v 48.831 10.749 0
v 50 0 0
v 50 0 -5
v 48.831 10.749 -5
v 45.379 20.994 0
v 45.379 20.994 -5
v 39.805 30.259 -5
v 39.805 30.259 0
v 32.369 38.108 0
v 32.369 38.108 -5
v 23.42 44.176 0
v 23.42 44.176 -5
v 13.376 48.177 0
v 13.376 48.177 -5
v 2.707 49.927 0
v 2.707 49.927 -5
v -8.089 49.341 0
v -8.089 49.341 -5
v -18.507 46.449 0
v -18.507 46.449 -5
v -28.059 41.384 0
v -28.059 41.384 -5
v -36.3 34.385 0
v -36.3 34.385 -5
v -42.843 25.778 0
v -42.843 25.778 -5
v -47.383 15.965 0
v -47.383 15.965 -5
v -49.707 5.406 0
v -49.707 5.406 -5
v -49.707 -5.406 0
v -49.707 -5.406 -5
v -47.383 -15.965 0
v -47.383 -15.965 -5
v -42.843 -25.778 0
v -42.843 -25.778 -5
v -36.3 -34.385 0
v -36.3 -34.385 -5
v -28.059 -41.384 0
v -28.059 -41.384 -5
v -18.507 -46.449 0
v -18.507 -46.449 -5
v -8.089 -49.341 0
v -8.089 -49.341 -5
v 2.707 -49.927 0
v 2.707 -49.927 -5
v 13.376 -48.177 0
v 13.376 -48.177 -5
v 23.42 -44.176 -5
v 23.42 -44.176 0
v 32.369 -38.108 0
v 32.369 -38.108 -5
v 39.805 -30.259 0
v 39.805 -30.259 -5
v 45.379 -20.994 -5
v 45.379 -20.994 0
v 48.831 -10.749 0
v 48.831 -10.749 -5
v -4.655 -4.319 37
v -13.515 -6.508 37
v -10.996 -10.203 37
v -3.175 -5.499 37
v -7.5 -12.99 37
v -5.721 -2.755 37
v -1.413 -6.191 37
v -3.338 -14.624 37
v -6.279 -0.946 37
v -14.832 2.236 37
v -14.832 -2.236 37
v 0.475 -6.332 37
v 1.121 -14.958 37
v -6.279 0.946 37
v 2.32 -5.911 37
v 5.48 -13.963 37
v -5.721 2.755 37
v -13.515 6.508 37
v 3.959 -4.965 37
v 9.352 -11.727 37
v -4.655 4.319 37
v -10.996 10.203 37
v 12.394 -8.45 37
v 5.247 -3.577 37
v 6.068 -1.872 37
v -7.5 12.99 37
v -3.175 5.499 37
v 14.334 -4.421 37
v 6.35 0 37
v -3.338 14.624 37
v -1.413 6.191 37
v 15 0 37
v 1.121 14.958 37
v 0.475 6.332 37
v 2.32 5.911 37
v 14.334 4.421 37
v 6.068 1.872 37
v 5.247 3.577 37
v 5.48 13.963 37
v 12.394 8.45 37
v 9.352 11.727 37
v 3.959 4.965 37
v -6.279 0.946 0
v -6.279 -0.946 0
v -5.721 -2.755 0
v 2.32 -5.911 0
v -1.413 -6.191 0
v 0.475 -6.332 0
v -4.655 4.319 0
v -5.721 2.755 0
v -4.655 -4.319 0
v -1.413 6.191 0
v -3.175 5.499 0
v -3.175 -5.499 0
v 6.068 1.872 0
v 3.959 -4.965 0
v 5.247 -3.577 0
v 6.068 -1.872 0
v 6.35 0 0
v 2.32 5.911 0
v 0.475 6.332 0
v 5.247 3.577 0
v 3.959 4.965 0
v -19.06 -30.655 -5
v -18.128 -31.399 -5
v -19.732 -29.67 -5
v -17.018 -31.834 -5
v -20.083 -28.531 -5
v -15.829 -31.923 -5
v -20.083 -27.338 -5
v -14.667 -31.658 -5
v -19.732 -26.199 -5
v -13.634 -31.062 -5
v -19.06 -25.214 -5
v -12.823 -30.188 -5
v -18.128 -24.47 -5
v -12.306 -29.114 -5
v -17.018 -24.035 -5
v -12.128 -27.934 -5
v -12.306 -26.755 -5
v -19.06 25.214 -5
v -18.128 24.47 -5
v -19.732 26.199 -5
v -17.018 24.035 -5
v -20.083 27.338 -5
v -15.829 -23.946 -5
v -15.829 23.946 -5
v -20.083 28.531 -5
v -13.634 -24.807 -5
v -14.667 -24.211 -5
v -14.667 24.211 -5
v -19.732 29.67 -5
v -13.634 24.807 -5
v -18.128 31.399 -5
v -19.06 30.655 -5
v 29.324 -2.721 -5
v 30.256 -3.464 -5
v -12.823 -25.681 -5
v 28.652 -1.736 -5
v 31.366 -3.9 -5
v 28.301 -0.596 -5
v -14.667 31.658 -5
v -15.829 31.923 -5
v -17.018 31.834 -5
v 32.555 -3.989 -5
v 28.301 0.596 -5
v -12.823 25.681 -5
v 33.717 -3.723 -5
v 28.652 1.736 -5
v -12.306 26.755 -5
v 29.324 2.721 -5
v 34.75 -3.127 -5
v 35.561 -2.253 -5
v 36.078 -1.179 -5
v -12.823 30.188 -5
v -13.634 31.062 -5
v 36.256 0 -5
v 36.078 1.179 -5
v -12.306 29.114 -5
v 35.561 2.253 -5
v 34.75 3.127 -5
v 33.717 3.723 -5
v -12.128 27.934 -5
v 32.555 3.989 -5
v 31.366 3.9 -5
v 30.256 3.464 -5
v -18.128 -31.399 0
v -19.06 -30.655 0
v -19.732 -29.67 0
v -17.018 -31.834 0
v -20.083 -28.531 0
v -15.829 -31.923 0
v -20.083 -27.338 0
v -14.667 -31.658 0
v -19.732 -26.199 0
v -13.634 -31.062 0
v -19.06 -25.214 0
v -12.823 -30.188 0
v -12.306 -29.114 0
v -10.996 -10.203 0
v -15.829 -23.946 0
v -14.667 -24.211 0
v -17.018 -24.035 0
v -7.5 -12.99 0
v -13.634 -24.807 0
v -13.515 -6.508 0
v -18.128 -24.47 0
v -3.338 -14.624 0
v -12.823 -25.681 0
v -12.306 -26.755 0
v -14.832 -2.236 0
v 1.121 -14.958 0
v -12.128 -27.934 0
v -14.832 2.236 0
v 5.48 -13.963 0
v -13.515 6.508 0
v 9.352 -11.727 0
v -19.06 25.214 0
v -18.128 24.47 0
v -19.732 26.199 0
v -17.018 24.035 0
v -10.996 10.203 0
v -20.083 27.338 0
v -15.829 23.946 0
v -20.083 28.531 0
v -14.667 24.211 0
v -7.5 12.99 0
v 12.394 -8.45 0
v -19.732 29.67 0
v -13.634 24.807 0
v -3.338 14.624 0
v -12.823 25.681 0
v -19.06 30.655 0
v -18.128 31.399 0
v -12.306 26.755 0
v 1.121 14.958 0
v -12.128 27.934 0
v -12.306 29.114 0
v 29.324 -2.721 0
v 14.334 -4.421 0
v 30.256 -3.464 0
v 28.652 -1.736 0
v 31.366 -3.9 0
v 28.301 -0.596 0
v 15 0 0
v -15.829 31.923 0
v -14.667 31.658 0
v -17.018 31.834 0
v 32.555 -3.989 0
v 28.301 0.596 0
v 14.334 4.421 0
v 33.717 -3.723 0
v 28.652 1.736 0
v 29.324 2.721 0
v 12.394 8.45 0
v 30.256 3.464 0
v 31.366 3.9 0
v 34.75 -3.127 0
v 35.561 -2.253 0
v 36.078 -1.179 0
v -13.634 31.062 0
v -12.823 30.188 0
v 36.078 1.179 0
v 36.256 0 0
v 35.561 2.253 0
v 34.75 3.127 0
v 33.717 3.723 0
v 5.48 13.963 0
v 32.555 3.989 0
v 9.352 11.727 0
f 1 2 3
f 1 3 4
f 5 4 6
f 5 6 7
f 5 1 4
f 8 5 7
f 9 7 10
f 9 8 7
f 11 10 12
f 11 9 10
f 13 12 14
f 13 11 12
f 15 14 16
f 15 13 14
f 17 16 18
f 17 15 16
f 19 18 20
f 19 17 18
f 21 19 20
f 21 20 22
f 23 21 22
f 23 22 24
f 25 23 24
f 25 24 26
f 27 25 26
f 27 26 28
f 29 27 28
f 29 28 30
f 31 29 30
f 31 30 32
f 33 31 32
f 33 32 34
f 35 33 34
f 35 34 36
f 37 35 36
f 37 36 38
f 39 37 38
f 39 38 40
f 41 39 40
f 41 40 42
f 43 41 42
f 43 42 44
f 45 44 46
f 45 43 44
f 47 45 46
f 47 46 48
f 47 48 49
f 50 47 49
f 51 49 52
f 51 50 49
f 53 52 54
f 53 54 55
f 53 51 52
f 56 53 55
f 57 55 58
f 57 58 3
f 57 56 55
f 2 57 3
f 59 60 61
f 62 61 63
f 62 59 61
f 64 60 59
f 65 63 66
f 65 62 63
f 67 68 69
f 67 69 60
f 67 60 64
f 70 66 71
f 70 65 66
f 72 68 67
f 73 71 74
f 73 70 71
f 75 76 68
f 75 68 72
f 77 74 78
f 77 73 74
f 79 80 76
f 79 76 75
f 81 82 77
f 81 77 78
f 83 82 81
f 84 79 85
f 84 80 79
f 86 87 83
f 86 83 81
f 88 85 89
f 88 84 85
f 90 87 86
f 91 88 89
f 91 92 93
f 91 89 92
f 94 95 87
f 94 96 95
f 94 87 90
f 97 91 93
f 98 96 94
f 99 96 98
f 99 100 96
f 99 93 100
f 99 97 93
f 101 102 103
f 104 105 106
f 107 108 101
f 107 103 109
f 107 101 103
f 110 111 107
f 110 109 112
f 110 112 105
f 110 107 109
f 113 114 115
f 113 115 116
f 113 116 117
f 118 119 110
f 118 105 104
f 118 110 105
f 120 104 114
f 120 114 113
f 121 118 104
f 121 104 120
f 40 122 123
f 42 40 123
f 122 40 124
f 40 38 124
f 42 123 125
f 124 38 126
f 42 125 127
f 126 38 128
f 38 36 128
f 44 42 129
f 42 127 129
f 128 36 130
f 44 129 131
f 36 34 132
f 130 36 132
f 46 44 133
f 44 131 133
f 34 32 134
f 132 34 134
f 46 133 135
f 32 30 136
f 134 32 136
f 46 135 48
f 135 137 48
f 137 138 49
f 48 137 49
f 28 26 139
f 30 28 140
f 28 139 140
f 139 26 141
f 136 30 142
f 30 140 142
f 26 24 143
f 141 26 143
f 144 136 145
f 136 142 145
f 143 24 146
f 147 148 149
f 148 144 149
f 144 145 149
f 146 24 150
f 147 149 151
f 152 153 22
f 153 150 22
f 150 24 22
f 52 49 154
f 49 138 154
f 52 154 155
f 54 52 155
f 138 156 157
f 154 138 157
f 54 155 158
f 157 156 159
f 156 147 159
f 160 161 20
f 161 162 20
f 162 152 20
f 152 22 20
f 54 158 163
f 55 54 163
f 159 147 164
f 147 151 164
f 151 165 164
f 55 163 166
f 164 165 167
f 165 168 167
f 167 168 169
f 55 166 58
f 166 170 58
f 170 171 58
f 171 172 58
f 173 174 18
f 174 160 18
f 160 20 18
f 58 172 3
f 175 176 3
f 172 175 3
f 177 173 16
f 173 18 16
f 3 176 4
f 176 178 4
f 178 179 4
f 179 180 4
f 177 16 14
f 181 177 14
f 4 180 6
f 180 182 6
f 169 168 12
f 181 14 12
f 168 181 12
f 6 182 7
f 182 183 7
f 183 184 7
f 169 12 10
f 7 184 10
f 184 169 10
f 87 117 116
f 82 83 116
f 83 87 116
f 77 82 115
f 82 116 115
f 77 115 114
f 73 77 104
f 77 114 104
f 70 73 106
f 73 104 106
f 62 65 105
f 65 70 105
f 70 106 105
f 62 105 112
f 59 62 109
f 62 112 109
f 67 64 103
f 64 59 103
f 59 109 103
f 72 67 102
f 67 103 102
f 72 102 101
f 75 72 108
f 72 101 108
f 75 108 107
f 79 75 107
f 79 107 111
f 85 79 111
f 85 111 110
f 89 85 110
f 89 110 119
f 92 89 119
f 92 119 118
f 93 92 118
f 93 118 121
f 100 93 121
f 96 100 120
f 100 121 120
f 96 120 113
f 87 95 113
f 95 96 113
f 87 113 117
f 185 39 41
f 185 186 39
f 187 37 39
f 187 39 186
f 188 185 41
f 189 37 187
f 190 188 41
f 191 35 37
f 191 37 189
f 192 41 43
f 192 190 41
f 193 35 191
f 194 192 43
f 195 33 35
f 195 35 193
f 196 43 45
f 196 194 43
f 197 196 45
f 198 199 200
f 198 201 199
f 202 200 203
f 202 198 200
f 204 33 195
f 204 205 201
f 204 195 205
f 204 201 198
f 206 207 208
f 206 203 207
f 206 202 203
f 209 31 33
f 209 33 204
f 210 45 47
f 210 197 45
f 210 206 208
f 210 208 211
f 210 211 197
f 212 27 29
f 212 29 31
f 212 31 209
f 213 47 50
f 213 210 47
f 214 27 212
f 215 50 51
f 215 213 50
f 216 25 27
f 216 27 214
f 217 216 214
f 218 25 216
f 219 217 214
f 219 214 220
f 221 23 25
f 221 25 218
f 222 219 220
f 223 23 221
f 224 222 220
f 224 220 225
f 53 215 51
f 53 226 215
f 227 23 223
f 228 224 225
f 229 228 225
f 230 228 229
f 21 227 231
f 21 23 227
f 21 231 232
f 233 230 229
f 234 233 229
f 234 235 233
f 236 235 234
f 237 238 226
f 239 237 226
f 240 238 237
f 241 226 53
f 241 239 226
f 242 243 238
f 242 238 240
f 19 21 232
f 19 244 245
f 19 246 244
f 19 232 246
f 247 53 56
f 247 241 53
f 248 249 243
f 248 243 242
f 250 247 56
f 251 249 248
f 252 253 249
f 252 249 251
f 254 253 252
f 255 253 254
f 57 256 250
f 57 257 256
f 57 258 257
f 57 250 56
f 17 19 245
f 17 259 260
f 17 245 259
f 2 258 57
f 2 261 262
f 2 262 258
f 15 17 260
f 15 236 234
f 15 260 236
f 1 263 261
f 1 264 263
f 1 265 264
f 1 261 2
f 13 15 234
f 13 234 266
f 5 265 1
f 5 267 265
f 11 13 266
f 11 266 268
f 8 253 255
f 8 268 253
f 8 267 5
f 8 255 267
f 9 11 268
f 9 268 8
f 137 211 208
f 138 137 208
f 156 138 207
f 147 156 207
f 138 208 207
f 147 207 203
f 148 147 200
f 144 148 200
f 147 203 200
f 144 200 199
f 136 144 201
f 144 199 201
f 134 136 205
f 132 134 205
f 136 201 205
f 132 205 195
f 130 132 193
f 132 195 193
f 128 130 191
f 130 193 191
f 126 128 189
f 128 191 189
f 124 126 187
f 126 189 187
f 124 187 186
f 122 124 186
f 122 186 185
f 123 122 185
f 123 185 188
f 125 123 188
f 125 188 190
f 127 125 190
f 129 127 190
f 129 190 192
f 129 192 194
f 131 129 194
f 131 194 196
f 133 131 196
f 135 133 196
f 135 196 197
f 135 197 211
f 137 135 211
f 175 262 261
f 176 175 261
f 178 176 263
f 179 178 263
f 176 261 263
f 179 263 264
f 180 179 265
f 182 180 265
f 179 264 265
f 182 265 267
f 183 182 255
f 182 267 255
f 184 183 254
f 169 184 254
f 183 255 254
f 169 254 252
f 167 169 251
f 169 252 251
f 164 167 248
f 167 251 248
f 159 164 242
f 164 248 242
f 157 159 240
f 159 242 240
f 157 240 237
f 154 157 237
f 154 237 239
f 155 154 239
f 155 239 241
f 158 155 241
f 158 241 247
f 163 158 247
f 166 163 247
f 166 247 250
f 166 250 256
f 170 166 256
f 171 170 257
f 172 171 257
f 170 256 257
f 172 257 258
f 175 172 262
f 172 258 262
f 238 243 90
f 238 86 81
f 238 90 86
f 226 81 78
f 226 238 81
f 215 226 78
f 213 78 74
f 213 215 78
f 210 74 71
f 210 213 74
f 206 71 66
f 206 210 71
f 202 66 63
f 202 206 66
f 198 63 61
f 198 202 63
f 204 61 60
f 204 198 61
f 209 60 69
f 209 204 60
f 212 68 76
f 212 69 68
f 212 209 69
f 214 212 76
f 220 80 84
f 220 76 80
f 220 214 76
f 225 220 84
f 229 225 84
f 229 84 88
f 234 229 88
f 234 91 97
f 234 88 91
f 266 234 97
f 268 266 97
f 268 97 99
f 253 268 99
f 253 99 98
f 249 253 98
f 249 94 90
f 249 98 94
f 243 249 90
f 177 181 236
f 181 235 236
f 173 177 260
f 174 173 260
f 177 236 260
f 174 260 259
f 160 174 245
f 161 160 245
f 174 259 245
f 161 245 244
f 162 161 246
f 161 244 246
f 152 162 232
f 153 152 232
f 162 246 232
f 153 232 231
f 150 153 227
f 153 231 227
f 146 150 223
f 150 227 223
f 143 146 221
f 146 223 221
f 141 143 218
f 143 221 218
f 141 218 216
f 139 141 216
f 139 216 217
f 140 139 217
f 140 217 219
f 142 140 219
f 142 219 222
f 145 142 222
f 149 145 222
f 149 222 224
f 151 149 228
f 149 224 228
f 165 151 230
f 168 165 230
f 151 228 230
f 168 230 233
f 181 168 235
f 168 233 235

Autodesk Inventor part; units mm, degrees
ref_plane "YZ Plane" through (0, 0, 0) normal (1, 0, 0) x (0, 1, 0)
ref_plane "XZ Plane" through (0, 0, 0) normal (0, 1, 0) x (-1, 0, 0)
ref_plane "XY Plane" through (0, 0, 0) normal (0, 0, 1) x (1, 0, 0)
sketch "Sketch1" plane through (0, 0, 0) normal (0, 0, 1) x (1, 0, 0)
  circle A0 centre (0, 0) radius 100
  line L0 (0, 100) -> (86.6025, 50)
  line L1 (86.6025, 50) -> (86.6025, -50)
  line L2 (86.6025, -50) -> (0, -100)
  line L3 (0, -100) -> (-86.6025, -50)
  line L4 (-86.6025, -50) -> (-86.6025, 50)
  line L5 (-86.6025, 50) -> (0, 100)
  circle A1 centre (0, 0) radius 50
  circle A2 centre (0, 0) radius 15
  circle A3 centre (0, 0) radius 6.35
  circle A4 centre (32.256, 0) radius 4
  circle A5 centre (-16.128, 27.9345) radius 4
  circle A6 centre (-16.128, -27.9345) radius 4
  dimension "d0" = 200
  dimension "d1" = 100
  dimension "d2" = 30
  dimension "d3" = 12.7
  dimension "d4" = 8
  dimension "d7" = 360
extrude "Plate1" add sketch "Sketch1" against normal blind 5 contours A1 | A2 | A3
extrude "Extrusion1" add sketch "Sketch1" along normal blind 37 contours A2
thread "Thread1" size "M14x2" class "6H" standard "ANSI Metric M Profile" full length
equation "\"d9\" = Thickness"
equation "\"BendRadius\" = Thickness"
equation "\"BendReliefWidth\" = Thickness"
equation "\"BendReliefDepth\" = 0.5 * Thickness"
equation "\"TransitionRadius\" = BendRadius"
equation "\"JacobiRadiusSize\" = BendRadius"
equation "\"GapSize\" = Thickness"
equation "\"Thickness\" = 5"
properties part number "Test flange" material "Aluminum 6061"
